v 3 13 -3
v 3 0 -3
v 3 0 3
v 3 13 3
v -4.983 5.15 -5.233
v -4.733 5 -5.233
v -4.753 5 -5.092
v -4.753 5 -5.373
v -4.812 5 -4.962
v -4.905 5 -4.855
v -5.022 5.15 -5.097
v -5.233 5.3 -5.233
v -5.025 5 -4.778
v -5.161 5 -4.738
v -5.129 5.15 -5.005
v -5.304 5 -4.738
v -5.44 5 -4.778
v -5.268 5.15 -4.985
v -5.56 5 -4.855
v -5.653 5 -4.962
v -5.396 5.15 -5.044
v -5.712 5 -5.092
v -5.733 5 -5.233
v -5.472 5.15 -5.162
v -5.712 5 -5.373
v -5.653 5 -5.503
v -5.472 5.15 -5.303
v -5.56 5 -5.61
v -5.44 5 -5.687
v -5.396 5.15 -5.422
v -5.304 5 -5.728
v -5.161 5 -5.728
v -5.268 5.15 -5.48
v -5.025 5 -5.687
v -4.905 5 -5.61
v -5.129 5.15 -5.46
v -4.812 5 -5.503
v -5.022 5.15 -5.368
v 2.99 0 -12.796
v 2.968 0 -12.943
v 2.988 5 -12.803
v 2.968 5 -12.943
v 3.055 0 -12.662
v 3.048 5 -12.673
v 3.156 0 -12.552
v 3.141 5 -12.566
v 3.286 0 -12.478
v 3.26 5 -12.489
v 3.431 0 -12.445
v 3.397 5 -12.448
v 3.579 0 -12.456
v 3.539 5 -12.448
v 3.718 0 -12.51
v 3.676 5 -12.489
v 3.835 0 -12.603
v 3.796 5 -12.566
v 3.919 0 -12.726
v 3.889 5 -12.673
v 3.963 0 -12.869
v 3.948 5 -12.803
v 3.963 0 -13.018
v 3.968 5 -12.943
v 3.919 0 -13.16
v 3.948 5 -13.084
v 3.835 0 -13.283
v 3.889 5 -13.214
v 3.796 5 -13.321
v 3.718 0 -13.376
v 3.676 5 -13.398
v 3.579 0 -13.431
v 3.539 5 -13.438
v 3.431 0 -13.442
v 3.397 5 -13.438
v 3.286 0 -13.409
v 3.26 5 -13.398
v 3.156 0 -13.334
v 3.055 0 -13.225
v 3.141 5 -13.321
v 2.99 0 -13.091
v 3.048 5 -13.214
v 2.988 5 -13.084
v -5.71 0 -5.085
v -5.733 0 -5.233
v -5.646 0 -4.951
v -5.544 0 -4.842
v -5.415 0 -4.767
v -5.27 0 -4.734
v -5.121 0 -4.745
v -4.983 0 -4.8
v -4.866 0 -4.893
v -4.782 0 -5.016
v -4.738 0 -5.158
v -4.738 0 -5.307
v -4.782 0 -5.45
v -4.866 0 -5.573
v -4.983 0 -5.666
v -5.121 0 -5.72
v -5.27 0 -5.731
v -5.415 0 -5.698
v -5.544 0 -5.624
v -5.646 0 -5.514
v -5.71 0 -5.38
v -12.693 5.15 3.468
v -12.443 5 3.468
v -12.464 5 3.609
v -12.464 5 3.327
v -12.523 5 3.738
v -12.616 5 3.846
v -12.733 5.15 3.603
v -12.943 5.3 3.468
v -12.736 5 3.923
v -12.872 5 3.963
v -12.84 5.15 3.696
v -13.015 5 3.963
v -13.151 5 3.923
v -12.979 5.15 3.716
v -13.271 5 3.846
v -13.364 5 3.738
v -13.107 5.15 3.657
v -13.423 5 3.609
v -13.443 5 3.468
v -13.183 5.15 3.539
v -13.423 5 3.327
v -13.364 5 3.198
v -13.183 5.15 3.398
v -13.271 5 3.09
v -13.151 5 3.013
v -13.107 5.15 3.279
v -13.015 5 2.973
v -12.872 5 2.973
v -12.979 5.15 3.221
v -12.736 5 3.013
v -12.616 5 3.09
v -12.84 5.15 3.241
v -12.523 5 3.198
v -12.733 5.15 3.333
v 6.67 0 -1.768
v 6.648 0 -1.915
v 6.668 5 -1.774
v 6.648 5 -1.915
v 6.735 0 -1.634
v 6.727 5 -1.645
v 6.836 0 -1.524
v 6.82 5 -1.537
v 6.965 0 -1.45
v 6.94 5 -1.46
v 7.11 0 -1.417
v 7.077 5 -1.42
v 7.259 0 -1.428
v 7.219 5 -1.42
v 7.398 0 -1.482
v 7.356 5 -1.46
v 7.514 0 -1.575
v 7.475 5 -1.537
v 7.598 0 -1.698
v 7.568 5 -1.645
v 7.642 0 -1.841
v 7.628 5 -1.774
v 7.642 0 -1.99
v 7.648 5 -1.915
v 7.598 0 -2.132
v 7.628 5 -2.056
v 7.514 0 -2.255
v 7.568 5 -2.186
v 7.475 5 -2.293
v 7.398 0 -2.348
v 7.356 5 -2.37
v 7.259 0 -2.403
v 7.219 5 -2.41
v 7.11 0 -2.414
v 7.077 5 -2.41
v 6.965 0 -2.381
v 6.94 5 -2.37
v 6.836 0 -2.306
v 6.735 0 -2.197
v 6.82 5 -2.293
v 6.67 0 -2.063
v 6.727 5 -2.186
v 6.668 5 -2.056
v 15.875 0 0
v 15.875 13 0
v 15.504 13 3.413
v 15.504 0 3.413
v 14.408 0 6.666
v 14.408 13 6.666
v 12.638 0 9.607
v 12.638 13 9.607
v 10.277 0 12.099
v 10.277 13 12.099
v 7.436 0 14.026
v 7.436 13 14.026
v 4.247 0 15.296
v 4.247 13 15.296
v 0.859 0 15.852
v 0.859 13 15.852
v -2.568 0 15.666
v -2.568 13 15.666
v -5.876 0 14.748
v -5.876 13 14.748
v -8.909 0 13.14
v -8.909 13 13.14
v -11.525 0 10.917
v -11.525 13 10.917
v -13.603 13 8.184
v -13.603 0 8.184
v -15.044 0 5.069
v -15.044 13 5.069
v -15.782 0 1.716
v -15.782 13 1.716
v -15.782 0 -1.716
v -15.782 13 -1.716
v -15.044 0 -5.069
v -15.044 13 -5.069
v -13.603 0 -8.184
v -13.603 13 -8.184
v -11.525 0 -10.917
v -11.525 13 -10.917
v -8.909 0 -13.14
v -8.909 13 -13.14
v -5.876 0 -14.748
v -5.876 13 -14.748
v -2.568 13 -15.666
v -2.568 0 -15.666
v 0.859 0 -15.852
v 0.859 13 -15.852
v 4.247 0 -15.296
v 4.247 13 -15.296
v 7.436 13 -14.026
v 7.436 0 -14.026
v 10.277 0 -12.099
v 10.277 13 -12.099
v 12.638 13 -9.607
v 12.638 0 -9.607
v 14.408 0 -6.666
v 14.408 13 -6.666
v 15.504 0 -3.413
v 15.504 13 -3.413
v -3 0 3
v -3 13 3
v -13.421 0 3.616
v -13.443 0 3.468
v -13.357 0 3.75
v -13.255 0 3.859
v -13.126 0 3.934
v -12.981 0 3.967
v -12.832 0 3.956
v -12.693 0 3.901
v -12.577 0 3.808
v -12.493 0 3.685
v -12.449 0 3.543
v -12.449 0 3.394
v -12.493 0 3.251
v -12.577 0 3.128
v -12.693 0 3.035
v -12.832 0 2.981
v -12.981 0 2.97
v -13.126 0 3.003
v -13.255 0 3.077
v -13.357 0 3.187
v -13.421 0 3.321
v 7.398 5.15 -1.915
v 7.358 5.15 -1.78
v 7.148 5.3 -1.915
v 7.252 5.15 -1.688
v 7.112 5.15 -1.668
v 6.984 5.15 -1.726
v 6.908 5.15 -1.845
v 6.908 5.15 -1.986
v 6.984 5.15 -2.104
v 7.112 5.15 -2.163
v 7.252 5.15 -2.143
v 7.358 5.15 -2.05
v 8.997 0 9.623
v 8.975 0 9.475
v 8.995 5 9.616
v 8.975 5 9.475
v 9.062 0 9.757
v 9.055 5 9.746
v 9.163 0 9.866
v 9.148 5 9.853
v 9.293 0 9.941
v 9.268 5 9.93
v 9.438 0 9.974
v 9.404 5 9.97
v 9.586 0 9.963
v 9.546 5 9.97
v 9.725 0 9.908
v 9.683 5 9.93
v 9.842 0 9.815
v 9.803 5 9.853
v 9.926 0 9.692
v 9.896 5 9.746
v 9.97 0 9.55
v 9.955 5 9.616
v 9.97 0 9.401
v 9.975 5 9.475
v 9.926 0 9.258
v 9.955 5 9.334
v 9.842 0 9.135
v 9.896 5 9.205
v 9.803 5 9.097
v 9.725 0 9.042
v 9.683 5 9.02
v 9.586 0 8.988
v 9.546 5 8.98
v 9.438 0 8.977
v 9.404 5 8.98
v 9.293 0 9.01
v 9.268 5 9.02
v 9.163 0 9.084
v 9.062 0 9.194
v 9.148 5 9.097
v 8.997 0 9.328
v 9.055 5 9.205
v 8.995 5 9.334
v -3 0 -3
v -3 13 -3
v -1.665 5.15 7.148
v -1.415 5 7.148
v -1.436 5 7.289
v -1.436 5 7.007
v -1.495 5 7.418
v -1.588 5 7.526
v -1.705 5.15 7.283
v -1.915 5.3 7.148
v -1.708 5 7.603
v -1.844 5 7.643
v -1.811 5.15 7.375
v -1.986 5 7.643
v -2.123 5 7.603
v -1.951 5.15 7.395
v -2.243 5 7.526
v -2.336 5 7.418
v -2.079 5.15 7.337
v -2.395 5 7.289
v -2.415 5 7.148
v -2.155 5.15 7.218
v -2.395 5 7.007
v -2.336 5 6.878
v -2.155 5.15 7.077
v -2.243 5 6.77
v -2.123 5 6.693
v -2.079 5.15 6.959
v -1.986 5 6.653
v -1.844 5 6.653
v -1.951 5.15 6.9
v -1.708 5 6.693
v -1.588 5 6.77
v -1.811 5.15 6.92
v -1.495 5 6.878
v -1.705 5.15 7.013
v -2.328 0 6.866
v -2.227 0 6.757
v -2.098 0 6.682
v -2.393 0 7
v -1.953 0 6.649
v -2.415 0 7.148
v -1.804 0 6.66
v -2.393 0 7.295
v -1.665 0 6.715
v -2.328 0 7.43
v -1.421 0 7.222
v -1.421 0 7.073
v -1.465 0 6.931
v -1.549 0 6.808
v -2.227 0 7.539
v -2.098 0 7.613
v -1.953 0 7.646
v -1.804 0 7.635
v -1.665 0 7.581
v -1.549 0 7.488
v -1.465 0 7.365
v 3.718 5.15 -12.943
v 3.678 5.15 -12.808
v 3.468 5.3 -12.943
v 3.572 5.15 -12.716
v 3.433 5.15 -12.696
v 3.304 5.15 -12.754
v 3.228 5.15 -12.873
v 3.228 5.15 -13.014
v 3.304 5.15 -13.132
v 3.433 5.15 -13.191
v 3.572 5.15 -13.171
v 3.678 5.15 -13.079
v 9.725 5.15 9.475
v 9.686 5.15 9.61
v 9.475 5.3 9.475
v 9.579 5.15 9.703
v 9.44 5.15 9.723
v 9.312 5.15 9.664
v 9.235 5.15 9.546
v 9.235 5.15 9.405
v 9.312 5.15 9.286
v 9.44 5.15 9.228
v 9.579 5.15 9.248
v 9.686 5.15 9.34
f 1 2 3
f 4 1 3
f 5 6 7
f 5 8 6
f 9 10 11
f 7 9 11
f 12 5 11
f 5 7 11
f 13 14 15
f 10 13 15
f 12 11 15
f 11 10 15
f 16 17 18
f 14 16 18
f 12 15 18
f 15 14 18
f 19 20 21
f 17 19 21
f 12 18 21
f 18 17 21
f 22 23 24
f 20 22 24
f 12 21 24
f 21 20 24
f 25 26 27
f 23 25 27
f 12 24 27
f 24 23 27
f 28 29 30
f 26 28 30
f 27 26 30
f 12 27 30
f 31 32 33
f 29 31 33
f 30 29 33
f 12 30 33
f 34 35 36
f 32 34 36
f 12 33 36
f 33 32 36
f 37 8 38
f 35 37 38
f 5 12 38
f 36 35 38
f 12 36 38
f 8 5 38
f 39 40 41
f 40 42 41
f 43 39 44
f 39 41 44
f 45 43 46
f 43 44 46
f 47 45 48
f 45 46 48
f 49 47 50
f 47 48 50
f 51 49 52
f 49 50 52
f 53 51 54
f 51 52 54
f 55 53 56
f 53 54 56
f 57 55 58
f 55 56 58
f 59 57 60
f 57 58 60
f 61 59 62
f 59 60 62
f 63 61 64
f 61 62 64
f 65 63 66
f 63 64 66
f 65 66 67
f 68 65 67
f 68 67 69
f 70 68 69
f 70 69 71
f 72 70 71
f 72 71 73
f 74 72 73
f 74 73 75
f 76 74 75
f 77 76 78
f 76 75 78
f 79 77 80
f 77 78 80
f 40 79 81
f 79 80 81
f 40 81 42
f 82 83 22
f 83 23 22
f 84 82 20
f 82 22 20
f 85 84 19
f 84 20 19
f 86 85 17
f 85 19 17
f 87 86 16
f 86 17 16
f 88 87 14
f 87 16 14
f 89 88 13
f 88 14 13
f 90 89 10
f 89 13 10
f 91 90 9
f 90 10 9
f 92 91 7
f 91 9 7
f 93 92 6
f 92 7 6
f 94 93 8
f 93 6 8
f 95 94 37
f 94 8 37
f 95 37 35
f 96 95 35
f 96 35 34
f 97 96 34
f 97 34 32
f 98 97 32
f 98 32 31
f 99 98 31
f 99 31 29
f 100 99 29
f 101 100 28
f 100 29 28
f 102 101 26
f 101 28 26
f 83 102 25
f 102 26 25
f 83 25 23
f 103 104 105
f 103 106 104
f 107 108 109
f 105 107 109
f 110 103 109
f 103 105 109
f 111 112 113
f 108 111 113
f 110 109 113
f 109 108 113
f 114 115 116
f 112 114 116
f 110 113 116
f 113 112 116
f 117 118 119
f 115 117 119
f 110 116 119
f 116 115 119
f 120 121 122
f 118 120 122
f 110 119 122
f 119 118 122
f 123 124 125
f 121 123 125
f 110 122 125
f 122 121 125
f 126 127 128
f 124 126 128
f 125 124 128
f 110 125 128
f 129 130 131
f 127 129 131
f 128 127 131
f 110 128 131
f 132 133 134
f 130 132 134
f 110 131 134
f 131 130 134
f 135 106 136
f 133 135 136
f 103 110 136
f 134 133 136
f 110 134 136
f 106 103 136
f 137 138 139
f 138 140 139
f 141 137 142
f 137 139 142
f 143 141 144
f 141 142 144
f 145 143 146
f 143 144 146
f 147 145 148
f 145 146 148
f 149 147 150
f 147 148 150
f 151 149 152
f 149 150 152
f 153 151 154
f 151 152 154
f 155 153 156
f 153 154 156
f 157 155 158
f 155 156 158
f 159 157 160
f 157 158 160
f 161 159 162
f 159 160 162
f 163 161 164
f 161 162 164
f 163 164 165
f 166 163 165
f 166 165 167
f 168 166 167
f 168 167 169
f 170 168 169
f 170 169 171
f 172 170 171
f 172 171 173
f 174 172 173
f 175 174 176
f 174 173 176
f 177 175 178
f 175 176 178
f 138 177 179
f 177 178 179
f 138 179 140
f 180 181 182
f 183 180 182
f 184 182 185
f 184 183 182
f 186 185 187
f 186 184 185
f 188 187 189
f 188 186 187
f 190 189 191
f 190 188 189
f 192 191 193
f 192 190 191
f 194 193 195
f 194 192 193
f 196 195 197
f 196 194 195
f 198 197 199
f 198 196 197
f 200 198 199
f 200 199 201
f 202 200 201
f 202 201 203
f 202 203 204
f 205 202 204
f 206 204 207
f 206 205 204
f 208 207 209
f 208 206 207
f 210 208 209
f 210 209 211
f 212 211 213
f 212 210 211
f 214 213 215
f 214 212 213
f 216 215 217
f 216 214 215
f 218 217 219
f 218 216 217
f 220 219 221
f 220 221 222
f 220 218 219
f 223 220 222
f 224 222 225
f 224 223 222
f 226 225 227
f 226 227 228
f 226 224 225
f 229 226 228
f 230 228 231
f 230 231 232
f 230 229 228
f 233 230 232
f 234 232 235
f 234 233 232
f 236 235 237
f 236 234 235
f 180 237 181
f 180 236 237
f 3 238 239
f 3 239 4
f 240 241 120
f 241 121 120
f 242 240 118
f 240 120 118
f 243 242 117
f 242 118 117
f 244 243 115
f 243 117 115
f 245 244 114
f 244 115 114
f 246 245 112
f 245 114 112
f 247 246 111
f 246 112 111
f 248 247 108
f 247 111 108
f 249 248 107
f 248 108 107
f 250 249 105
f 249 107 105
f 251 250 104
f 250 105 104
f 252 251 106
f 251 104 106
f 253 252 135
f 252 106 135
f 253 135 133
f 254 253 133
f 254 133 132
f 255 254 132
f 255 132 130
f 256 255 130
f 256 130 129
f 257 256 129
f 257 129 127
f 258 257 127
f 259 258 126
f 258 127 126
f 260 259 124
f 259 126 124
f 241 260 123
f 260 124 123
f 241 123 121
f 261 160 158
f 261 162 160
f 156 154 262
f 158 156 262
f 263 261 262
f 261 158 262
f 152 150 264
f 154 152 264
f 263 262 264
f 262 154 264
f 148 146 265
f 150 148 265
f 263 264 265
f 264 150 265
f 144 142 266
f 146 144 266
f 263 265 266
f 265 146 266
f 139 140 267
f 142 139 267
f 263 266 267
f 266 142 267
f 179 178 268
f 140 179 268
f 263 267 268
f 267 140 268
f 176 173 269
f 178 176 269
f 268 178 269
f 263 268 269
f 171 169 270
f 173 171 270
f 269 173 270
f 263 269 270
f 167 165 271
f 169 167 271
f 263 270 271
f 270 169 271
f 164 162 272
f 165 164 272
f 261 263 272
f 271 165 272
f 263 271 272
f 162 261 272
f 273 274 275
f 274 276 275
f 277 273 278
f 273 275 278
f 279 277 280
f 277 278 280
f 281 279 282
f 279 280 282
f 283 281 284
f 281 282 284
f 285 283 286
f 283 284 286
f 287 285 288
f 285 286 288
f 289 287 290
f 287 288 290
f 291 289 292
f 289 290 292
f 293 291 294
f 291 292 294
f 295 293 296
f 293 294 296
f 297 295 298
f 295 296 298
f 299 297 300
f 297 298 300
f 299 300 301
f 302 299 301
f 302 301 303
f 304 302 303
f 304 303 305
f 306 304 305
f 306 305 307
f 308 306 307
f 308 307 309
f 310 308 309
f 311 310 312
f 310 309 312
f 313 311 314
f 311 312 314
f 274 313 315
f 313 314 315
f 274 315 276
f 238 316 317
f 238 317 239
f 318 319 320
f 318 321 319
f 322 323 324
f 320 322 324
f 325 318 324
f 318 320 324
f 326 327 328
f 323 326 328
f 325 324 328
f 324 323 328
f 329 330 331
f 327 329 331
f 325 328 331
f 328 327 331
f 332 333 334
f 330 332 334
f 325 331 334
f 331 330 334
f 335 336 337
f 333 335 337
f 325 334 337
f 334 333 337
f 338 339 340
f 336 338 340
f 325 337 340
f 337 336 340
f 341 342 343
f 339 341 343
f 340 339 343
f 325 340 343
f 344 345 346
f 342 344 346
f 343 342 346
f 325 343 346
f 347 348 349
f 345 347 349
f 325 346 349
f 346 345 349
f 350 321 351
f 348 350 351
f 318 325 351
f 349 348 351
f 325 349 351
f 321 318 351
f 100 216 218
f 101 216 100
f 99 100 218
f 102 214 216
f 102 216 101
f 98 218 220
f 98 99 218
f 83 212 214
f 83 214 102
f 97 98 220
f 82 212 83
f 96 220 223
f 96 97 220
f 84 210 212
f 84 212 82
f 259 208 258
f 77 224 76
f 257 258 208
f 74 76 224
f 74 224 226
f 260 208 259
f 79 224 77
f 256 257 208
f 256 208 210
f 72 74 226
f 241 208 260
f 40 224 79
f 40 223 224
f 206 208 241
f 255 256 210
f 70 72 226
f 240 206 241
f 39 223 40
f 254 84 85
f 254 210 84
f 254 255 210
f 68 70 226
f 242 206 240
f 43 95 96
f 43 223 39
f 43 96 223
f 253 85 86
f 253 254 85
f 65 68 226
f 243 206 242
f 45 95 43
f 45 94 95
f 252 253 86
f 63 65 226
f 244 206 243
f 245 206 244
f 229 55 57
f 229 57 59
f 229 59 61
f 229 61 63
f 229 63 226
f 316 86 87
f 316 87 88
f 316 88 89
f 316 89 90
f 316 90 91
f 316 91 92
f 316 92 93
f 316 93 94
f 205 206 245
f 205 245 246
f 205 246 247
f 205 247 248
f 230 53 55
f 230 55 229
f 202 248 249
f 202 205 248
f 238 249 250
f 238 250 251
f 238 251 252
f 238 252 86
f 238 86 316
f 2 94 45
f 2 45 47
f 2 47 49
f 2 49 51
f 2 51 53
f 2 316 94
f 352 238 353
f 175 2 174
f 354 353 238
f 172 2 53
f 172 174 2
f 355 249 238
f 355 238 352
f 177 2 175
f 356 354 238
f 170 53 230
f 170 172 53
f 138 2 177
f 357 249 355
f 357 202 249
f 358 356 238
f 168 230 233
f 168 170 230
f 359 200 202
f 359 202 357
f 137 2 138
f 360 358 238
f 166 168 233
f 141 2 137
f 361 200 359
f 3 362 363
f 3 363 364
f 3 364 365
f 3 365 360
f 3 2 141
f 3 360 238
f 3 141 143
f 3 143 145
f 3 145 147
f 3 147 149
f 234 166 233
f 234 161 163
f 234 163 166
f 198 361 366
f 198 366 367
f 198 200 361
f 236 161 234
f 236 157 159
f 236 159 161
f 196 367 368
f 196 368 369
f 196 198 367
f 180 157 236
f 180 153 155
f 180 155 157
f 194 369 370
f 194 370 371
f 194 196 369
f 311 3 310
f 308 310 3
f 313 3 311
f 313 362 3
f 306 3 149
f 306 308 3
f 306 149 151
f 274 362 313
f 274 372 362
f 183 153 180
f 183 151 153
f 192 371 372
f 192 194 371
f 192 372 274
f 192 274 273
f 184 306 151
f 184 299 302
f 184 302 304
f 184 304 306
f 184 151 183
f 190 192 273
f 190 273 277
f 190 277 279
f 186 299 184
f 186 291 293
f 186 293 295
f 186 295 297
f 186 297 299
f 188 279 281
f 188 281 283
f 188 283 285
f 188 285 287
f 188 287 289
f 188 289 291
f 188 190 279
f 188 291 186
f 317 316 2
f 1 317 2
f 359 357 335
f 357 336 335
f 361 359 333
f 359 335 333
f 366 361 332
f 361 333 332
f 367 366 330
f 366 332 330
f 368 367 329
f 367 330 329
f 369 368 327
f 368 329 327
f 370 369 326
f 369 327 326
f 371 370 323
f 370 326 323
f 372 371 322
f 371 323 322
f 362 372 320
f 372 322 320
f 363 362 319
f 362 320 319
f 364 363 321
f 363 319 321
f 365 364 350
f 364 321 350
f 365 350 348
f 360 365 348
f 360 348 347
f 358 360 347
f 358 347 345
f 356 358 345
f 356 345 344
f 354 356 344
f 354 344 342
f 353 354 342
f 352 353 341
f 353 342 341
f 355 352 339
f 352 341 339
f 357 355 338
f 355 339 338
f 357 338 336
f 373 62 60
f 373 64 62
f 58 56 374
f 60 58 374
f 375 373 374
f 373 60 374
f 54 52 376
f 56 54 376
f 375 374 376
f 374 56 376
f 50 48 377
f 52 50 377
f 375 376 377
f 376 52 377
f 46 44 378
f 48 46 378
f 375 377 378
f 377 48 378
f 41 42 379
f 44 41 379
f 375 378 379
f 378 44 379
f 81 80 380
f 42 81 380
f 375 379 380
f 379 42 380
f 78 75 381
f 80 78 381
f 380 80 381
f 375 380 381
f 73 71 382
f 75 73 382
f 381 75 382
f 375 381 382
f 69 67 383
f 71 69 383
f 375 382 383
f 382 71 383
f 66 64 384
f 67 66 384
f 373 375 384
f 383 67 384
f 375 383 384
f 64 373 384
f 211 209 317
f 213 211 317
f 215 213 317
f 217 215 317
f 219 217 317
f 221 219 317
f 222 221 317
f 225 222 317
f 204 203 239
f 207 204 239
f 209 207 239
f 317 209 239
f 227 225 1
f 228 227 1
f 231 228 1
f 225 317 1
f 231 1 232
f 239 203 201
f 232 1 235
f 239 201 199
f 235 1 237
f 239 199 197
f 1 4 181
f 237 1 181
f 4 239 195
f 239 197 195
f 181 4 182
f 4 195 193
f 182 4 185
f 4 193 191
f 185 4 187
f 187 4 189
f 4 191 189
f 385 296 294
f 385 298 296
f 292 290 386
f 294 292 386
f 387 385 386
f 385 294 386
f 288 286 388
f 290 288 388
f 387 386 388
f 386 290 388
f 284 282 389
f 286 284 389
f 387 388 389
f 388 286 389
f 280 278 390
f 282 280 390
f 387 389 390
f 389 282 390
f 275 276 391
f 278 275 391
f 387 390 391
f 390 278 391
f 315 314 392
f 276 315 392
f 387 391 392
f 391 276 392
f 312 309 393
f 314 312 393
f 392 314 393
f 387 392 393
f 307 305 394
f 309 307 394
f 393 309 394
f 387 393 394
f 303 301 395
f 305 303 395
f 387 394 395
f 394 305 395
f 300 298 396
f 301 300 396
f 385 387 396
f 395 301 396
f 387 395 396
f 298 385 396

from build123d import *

# Parameters (mm, degrees)
F0_R           = 15.875
F1_DEPTH       = 13
F2_W           = 6
F2_H           = 6
F3_DEPTH       = 13.001
F6_D           = 1
F6_DEPTH       = 5
F6_TIP         = 0.3004303095
F6_ON_F5_D     = 1
F6_ON_F5_DEPTH = 5
F6_ON_F5_TIP   = 0.3004303095


with BuildPart() as f1:
    # F0 (on Front) → F1 (new body)
    with BuildSketch(Plane.XZ):
        Circle(F0_R)
    extrude(amount=-F1_DEPTH)

    # F2 (on Front) → F3 (cut, through all)
    with BuildSketch(Plane.XZ):
        Rectangle(F2_W, F2_H)
    extrude(amount=-F3_DEPTH, mode=Mode.SUBTRACT)

    # F6
    with Locations(Plane.XZ):
        with Locations((9.4752308679, 9.4752308679), (3.4681752044, -12.9434060723), (-12.9434060723, 3.4681752044)):
            Hole(F6_D / 2, depth=F6_DEPTH)
            with Locations((0, 0, -(F6_DEPTH + F6_TIP / 2))):  # 118° drill point
                Cone(0, F6_D / 2, F6_TIP, mode=Mode.SUBTRACT)

    # F6 on F5
    with Locations(Plane.XZ):
        with Locations((-1.9152609338, 7.1478511145), (7.1478511145, -1.9152609338), (-5.2325901808, -5.2325901808)):
            Hole(F6_ON_F5_D / 2, depth=F6_ON_F5_DEPTH)
            with Locations((0, 0, -(F6_ON_F5_DEPTH + F6_ON_F5_TIP / 2))):  # 118° drill point
                Cone(0, F6_ON_F5_D / 2, F6_ON_F5_TIP, mode=Mode.SUBTRACT)


solid = f1.part
